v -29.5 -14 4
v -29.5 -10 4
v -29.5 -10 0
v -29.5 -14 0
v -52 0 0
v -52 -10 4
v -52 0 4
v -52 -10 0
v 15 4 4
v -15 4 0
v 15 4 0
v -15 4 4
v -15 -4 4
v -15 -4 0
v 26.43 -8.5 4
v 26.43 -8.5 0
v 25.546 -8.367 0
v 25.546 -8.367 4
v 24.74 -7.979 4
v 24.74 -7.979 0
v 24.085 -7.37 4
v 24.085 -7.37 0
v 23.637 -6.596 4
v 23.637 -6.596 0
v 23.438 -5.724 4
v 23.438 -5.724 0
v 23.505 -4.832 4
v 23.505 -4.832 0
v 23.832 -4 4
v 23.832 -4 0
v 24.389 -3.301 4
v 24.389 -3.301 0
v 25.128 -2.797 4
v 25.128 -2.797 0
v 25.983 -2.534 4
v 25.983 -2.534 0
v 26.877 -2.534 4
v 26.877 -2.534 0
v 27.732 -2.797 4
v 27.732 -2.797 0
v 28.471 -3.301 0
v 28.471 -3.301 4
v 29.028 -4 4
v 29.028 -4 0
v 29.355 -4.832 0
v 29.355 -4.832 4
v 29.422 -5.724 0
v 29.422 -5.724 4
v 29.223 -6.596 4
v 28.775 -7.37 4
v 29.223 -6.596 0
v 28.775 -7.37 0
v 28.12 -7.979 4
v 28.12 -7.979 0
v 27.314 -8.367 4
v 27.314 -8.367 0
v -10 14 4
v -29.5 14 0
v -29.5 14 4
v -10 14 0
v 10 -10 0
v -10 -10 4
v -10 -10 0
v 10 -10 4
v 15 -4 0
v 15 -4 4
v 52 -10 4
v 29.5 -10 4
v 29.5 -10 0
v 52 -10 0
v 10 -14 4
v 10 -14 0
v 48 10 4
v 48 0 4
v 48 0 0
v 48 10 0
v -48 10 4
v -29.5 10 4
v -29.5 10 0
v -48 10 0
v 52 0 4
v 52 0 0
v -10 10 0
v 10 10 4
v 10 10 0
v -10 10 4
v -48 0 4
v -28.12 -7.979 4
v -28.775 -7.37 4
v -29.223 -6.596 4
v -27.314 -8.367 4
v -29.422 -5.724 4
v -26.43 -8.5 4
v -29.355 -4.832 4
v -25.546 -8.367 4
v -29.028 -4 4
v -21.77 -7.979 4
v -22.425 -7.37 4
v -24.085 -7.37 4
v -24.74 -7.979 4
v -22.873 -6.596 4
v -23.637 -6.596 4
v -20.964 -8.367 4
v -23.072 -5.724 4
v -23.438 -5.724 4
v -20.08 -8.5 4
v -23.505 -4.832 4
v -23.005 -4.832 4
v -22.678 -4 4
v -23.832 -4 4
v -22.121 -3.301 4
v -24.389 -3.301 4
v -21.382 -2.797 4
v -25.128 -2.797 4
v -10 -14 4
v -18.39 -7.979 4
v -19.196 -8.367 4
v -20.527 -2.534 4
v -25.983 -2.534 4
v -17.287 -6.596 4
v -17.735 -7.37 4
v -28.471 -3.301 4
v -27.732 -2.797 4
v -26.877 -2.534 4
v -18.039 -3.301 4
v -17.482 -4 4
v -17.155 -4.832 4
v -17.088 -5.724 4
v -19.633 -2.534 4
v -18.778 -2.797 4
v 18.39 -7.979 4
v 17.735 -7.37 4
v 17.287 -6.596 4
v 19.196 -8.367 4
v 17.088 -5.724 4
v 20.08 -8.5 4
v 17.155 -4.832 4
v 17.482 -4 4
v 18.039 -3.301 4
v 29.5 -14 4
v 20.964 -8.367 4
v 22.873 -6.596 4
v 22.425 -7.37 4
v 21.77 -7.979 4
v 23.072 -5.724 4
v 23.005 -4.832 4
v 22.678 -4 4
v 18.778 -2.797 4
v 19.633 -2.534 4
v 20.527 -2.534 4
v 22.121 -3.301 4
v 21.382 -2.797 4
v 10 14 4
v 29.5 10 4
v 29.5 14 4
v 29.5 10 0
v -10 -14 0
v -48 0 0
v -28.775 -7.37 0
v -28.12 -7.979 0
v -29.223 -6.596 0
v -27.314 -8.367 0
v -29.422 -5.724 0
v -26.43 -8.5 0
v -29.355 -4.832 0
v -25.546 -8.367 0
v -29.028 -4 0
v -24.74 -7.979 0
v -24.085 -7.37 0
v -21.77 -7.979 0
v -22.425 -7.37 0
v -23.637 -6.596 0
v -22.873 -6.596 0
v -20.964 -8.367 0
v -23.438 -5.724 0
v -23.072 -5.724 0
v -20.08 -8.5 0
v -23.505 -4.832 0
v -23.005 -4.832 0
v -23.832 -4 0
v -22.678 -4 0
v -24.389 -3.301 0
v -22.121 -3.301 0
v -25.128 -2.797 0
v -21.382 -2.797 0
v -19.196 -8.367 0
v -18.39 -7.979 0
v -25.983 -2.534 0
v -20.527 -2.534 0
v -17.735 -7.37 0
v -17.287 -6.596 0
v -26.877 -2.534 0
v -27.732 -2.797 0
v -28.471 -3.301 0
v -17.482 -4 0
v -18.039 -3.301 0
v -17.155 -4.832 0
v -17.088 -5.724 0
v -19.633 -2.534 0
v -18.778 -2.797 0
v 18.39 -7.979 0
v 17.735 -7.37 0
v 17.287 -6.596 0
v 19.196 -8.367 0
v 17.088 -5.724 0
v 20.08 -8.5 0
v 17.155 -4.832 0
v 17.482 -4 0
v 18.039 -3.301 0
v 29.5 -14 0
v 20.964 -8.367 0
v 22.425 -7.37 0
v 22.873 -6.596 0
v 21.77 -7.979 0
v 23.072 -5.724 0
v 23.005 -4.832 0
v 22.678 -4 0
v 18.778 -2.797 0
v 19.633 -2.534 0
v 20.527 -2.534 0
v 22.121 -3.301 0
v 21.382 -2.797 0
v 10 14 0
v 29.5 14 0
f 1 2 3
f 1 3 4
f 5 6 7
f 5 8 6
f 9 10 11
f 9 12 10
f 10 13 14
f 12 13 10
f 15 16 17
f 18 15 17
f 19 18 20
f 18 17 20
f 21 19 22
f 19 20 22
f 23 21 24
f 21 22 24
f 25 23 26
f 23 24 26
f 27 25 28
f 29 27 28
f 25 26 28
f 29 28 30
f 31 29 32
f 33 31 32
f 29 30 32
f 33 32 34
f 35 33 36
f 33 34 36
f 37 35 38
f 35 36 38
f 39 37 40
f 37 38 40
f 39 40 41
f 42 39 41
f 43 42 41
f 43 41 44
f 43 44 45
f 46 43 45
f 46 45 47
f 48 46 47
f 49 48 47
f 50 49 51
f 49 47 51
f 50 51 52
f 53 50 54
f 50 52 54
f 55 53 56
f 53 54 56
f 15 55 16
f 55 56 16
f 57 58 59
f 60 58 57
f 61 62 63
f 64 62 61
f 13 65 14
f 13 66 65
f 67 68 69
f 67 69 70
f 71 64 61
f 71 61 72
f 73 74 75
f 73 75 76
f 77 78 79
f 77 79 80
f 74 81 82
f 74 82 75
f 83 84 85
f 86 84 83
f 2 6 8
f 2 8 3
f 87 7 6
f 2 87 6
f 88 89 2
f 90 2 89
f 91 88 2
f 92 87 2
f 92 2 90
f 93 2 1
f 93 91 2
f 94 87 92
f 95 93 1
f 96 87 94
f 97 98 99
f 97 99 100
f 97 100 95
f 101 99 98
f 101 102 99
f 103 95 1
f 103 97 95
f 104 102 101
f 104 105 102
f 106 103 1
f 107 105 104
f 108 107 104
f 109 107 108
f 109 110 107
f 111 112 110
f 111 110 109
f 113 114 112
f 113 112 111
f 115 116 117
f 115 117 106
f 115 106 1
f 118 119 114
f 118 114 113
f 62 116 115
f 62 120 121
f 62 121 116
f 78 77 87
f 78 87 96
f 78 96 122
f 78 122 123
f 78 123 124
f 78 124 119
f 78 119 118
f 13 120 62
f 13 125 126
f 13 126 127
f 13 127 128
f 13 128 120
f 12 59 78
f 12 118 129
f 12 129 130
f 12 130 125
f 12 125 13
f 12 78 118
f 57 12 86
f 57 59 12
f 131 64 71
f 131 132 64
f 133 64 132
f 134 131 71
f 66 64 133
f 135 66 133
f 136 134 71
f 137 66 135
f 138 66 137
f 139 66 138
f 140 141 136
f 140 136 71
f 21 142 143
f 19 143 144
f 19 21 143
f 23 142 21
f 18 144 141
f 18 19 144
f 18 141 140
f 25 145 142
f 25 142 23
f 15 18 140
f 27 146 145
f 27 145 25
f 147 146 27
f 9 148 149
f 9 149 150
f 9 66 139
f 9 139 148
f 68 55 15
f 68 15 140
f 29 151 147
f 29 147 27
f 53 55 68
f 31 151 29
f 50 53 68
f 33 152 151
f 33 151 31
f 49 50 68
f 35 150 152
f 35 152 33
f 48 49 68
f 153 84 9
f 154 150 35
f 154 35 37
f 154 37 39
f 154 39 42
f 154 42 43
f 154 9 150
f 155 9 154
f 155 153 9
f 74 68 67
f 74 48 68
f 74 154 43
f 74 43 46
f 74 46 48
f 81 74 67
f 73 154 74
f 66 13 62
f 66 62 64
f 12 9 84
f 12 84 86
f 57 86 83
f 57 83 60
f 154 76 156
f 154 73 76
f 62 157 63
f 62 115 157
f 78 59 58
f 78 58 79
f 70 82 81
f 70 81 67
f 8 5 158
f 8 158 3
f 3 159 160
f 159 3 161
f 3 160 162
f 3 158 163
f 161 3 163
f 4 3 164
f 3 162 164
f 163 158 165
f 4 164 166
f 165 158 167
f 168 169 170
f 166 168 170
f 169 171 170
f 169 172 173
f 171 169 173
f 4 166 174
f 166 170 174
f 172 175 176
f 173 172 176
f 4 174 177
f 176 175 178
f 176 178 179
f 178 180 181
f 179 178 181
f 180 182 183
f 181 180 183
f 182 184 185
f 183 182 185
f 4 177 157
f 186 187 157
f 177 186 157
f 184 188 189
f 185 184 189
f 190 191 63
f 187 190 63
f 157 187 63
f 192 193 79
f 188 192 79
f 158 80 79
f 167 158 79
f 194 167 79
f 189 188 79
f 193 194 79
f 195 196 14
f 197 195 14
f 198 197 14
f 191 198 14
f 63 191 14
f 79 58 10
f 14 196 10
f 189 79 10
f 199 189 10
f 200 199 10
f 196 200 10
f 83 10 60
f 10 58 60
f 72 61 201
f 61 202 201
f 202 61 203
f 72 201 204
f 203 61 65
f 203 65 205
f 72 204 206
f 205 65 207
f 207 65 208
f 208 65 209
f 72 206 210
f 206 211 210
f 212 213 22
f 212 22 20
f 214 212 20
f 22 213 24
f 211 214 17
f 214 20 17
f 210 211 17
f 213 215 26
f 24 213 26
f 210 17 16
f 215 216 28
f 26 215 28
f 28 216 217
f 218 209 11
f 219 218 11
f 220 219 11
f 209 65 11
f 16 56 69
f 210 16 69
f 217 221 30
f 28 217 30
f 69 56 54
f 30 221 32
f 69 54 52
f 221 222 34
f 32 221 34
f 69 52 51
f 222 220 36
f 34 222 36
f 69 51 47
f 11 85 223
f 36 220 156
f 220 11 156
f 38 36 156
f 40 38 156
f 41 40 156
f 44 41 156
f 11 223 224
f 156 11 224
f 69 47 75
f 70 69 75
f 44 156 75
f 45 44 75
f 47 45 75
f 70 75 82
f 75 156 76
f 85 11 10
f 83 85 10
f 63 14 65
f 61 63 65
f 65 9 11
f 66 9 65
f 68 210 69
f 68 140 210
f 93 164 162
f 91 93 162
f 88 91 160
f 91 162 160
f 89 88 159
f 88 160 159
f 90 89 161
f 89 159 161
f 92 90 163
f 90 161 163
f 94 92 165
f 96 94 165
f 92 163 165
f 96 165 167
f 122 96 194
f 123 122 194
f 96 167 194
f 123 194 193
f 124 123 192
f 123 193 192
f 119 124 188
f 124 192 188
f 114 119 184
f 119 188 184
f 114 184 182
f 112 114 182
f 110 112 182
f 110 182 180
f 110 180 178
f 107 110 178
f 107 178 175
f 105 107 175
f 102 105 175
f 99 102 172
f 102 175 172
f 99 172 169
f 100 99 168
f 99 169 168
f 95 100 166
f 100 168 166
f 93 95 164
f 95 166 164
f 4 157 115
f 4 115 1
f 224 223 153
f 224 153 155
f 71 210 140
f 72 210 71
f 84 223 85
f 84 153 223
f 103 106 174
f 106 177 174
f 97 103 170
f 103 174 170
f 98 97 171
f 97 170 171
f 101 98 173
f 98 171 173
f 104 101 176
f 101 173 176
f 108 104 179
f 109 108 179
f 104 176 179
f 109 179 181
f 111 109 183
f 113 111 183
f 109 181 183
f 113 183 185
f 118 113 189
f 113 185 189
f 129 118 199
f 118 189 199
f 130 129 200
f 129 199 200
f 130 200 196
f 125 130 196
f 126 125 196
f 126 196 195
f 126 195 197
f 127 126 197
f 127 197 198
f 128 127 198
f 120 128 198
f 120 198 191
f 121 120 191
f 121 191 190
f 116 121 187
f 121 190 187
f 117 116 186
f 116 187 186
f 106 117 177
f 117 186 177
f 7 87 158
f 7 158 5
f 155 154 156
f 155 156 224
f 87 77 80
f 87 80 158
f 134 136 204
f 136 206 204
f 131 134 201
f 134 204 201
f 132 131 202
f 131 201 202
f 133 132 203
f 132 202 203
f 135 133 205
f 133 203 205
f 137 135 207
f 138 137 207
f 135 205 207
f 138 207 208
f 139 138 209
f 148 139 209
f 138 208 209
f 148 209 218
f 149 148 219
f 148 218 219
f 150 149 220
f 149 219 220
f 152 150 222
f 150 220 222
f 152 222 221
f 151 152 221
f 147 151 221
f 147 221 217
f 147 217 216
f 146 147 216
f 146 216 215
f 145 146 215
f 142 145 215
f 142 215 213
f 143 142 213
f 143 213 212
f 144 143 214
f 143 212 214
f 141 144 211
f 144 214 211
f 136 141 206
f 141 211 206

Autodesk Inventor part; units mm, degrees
ref_plane "YZ Plane" through (0, 0, 0) normal (1, 0, 0) x (0, 1, 0)
ref_plane "XZ Plane" through (0, 0, 0) normal (0, 1, 0) x (-1, 0, 0)
ref_plane "XY Plane" through (0, 0, 0) normal (0, 0, 1) x (1, 0, 0)
sketch "Sketch1" plane through (0, 0, 0) normal (0, 0, 1) x (1, 0, 0)
  line L0 (-52, 14) -> (52, 14)
  line L1 (52, 14) -> (52, -14)
  line L2 (52, -14) -> (-52, -14)
  line L3 (-52, -14) -> (-52, 14)
  point P0 (0, 0)
  dimension "d0" = 104
  dimension "d1" = 28
  dimension "d2" = 52
  dimension "d3" = 14
extrude "Base" add sketch "Sketch1" along normal blind 4
sketch "Sketch2" plane through (0, 0, 4) normal (0, 0, 1) x (1, 0, 0)
  line L0 (52, 14) -> (52, -14) projected
  line L1 (-52, 14) -> (52, 14) projected
  line L2 (-52, -14) -> (-52, 14) projected
  line L3 (52, -14) -> (-52, -14) projected
  line L4 (-52, 14) -> (-29.5, 14)
  line L5 (-29.5, 14) -> (-29.5, 10)
  line L6 (-29.5, 10) -> (-52, 10)
  line L7 (-52, 10) -> (-52, 14)
  line L8 (-52, -10) -> (-29.5, -10)
  line L9 (-29.5, -10) -> (-29.5, -14)
  line L10 (-29.5, -14) -> (-52, -14)
  line L11 (-52, -14) -> (-52, -10)
  line L12 (29.5, -10) -> (52, -10)
  line L13 (52, -10) -> (52, -14)
  line L14 (52, -14) -> (29.5, -14)
  line L15 (29.5, -14) -> (29.5, -10)
  line L16 (29.5, 14) -> (52, 14)
  line L17 (52, 14) -> (52, 10)
  line L18 (52, 10) -> (29.5, 10)
  line L19 (29.5, 10) -> (29.5, 14)
  line L20 (-10, 14) -> (10, 14)
  line L21 (10, 14) -> (10, 10)
  line L22 (10, 10) -> (-10, 10)
  line L23 (-10, 10) -> (-10, 14)
  line L24 (-10, -10) -> (10, -10)
  line L25 (10, -10) -> (10, -14)
  line L26 (10, -14) -> (-10, -14)
  line L27 (-10, -14) -> (-10, -10)
  point P0 (0, 0)
  dimension "d26" = 22.5
  dimension "d27" = 4
  dimension "d28" = 22.5
  dimension "d29" = 4
  dimension "d30" = 22.5
  dimension "d31" = 4
  dimension "d32" = 22.5
  dimension "d33" = 4
  dimension "d34" = 20
  dimension "d35" = 4
  dimension "d36" = 20
  dimension "d37" = 4
  dimension "d38" = 0
  dimension "d39" = 0
  dimension "d40" = 0
  dimension "d41" = 10
  dimension "d42" = 0
  dimension "d43" = 0
  dimension "d44" = 0
  dimension "d45" = 0
  dimension "d46" = 10
  dimension "d47" = 0
  dimension "d48" = 0
  dimension "d49" = 4
extrude "PlatformsPattern" cut sketch "Sketch2" against normal blind 4 contours L0 L18 L19 L1 | L0 L3 L15 L12 | L21 L22 L23 L1 | L5 L6 L2 L1 | L3 L27 L24 L25 | L3 L2 L8 L9
sketch "Sketch3" plane through (0, 0, 4) normal (0, 0, 1) x (1, 0, 0)
  line L0 (52, 10) -> (52, -10) projected
  line L1 (52, 10) -> (29.5, 10) projected
  line L2 (-29.5, 10) -> (-52, 10) projected
  line L3 (-52, -10) -> (-52, 10) projected
  line L4 (-52, 10) -> (-48, 10)
  line L5 (-48, 10) -> (-48, 0)
  line L6 (-48, 0) -> (-52, 0)
  line L7 (-52, 0) -> (-52, 10)
  line L8 (48, 10) -> (52, 10)
  line L9 (52, 10) -> (52, 0)
  line L10 (52, 0) -> (48, 0)
  line L11 (48, 0) -> (48, 10)
  point P0 (0, 0)
  dimension "d52" = 4
  dimension "d53" = 10
  dimension "d54" = 4
  dimension "d55" = 10
  dimension "d56" = 0
  dimension "d57" = 0
  dimension "d58" = 0
  dimension "d59" = 0
extrude "Sleeves" cut sketch "Sketch3" against normal blind 4
sketch "Sketch4" plane through (0, 0, 4) normal (0, 0, 1) x (1, 0, 0)
  line L0 (-15, 4) -> (15, 4)
  line L1 (15, 4) -> (15, -4)
  line L2 (15, -4) -> (-15, -4)
  line L3 (-15, -4) -> (-15, 4)
  point P0 (0, 0)
  dimension "d62" = 30
  dimension "d63" = 8
  dimension "d66" = 4
  dimension "d72" = 15
extrude "Cabling" cut sketch "Sketch4" against normal blind 4
sketch "Sketch5" plane through (0, 0, 4) normal (0, 0, 1) x (1, 0, 0)
  line L0 (15, 4) -> (15, -4) projected
  line L1 (52, 0) -> (48, 0) projected
  line L2 (29.5, -10) -> (52, -10) projected
  line L3 (52, 0) -> (52, -10) projected
  line L4 (0, 13.359) -> (0, -17.1065) construction
  point P0 (0, 0)
  point P1 (20.08, -5.5)
  point P2 (26.43, -5.5)
  point P3 (-20.08, -5.5)
  point P4 (-26.43, -5.5)
  dimension "d75" = 5.08
  dimension "d76" = 6.35
  dimension "d78" = 4.5
  dimension "d79" = 5.5
hole "ESCCutout" at (20.08, -5.5, 4) at (26.43, -5.5, 4) at (-20.08, -5.5, 4) at (-26.43, -5.5, 4) direction (0, 0, -1) diameter 6 end through all
properties part number "ShortMiddleStructure"
